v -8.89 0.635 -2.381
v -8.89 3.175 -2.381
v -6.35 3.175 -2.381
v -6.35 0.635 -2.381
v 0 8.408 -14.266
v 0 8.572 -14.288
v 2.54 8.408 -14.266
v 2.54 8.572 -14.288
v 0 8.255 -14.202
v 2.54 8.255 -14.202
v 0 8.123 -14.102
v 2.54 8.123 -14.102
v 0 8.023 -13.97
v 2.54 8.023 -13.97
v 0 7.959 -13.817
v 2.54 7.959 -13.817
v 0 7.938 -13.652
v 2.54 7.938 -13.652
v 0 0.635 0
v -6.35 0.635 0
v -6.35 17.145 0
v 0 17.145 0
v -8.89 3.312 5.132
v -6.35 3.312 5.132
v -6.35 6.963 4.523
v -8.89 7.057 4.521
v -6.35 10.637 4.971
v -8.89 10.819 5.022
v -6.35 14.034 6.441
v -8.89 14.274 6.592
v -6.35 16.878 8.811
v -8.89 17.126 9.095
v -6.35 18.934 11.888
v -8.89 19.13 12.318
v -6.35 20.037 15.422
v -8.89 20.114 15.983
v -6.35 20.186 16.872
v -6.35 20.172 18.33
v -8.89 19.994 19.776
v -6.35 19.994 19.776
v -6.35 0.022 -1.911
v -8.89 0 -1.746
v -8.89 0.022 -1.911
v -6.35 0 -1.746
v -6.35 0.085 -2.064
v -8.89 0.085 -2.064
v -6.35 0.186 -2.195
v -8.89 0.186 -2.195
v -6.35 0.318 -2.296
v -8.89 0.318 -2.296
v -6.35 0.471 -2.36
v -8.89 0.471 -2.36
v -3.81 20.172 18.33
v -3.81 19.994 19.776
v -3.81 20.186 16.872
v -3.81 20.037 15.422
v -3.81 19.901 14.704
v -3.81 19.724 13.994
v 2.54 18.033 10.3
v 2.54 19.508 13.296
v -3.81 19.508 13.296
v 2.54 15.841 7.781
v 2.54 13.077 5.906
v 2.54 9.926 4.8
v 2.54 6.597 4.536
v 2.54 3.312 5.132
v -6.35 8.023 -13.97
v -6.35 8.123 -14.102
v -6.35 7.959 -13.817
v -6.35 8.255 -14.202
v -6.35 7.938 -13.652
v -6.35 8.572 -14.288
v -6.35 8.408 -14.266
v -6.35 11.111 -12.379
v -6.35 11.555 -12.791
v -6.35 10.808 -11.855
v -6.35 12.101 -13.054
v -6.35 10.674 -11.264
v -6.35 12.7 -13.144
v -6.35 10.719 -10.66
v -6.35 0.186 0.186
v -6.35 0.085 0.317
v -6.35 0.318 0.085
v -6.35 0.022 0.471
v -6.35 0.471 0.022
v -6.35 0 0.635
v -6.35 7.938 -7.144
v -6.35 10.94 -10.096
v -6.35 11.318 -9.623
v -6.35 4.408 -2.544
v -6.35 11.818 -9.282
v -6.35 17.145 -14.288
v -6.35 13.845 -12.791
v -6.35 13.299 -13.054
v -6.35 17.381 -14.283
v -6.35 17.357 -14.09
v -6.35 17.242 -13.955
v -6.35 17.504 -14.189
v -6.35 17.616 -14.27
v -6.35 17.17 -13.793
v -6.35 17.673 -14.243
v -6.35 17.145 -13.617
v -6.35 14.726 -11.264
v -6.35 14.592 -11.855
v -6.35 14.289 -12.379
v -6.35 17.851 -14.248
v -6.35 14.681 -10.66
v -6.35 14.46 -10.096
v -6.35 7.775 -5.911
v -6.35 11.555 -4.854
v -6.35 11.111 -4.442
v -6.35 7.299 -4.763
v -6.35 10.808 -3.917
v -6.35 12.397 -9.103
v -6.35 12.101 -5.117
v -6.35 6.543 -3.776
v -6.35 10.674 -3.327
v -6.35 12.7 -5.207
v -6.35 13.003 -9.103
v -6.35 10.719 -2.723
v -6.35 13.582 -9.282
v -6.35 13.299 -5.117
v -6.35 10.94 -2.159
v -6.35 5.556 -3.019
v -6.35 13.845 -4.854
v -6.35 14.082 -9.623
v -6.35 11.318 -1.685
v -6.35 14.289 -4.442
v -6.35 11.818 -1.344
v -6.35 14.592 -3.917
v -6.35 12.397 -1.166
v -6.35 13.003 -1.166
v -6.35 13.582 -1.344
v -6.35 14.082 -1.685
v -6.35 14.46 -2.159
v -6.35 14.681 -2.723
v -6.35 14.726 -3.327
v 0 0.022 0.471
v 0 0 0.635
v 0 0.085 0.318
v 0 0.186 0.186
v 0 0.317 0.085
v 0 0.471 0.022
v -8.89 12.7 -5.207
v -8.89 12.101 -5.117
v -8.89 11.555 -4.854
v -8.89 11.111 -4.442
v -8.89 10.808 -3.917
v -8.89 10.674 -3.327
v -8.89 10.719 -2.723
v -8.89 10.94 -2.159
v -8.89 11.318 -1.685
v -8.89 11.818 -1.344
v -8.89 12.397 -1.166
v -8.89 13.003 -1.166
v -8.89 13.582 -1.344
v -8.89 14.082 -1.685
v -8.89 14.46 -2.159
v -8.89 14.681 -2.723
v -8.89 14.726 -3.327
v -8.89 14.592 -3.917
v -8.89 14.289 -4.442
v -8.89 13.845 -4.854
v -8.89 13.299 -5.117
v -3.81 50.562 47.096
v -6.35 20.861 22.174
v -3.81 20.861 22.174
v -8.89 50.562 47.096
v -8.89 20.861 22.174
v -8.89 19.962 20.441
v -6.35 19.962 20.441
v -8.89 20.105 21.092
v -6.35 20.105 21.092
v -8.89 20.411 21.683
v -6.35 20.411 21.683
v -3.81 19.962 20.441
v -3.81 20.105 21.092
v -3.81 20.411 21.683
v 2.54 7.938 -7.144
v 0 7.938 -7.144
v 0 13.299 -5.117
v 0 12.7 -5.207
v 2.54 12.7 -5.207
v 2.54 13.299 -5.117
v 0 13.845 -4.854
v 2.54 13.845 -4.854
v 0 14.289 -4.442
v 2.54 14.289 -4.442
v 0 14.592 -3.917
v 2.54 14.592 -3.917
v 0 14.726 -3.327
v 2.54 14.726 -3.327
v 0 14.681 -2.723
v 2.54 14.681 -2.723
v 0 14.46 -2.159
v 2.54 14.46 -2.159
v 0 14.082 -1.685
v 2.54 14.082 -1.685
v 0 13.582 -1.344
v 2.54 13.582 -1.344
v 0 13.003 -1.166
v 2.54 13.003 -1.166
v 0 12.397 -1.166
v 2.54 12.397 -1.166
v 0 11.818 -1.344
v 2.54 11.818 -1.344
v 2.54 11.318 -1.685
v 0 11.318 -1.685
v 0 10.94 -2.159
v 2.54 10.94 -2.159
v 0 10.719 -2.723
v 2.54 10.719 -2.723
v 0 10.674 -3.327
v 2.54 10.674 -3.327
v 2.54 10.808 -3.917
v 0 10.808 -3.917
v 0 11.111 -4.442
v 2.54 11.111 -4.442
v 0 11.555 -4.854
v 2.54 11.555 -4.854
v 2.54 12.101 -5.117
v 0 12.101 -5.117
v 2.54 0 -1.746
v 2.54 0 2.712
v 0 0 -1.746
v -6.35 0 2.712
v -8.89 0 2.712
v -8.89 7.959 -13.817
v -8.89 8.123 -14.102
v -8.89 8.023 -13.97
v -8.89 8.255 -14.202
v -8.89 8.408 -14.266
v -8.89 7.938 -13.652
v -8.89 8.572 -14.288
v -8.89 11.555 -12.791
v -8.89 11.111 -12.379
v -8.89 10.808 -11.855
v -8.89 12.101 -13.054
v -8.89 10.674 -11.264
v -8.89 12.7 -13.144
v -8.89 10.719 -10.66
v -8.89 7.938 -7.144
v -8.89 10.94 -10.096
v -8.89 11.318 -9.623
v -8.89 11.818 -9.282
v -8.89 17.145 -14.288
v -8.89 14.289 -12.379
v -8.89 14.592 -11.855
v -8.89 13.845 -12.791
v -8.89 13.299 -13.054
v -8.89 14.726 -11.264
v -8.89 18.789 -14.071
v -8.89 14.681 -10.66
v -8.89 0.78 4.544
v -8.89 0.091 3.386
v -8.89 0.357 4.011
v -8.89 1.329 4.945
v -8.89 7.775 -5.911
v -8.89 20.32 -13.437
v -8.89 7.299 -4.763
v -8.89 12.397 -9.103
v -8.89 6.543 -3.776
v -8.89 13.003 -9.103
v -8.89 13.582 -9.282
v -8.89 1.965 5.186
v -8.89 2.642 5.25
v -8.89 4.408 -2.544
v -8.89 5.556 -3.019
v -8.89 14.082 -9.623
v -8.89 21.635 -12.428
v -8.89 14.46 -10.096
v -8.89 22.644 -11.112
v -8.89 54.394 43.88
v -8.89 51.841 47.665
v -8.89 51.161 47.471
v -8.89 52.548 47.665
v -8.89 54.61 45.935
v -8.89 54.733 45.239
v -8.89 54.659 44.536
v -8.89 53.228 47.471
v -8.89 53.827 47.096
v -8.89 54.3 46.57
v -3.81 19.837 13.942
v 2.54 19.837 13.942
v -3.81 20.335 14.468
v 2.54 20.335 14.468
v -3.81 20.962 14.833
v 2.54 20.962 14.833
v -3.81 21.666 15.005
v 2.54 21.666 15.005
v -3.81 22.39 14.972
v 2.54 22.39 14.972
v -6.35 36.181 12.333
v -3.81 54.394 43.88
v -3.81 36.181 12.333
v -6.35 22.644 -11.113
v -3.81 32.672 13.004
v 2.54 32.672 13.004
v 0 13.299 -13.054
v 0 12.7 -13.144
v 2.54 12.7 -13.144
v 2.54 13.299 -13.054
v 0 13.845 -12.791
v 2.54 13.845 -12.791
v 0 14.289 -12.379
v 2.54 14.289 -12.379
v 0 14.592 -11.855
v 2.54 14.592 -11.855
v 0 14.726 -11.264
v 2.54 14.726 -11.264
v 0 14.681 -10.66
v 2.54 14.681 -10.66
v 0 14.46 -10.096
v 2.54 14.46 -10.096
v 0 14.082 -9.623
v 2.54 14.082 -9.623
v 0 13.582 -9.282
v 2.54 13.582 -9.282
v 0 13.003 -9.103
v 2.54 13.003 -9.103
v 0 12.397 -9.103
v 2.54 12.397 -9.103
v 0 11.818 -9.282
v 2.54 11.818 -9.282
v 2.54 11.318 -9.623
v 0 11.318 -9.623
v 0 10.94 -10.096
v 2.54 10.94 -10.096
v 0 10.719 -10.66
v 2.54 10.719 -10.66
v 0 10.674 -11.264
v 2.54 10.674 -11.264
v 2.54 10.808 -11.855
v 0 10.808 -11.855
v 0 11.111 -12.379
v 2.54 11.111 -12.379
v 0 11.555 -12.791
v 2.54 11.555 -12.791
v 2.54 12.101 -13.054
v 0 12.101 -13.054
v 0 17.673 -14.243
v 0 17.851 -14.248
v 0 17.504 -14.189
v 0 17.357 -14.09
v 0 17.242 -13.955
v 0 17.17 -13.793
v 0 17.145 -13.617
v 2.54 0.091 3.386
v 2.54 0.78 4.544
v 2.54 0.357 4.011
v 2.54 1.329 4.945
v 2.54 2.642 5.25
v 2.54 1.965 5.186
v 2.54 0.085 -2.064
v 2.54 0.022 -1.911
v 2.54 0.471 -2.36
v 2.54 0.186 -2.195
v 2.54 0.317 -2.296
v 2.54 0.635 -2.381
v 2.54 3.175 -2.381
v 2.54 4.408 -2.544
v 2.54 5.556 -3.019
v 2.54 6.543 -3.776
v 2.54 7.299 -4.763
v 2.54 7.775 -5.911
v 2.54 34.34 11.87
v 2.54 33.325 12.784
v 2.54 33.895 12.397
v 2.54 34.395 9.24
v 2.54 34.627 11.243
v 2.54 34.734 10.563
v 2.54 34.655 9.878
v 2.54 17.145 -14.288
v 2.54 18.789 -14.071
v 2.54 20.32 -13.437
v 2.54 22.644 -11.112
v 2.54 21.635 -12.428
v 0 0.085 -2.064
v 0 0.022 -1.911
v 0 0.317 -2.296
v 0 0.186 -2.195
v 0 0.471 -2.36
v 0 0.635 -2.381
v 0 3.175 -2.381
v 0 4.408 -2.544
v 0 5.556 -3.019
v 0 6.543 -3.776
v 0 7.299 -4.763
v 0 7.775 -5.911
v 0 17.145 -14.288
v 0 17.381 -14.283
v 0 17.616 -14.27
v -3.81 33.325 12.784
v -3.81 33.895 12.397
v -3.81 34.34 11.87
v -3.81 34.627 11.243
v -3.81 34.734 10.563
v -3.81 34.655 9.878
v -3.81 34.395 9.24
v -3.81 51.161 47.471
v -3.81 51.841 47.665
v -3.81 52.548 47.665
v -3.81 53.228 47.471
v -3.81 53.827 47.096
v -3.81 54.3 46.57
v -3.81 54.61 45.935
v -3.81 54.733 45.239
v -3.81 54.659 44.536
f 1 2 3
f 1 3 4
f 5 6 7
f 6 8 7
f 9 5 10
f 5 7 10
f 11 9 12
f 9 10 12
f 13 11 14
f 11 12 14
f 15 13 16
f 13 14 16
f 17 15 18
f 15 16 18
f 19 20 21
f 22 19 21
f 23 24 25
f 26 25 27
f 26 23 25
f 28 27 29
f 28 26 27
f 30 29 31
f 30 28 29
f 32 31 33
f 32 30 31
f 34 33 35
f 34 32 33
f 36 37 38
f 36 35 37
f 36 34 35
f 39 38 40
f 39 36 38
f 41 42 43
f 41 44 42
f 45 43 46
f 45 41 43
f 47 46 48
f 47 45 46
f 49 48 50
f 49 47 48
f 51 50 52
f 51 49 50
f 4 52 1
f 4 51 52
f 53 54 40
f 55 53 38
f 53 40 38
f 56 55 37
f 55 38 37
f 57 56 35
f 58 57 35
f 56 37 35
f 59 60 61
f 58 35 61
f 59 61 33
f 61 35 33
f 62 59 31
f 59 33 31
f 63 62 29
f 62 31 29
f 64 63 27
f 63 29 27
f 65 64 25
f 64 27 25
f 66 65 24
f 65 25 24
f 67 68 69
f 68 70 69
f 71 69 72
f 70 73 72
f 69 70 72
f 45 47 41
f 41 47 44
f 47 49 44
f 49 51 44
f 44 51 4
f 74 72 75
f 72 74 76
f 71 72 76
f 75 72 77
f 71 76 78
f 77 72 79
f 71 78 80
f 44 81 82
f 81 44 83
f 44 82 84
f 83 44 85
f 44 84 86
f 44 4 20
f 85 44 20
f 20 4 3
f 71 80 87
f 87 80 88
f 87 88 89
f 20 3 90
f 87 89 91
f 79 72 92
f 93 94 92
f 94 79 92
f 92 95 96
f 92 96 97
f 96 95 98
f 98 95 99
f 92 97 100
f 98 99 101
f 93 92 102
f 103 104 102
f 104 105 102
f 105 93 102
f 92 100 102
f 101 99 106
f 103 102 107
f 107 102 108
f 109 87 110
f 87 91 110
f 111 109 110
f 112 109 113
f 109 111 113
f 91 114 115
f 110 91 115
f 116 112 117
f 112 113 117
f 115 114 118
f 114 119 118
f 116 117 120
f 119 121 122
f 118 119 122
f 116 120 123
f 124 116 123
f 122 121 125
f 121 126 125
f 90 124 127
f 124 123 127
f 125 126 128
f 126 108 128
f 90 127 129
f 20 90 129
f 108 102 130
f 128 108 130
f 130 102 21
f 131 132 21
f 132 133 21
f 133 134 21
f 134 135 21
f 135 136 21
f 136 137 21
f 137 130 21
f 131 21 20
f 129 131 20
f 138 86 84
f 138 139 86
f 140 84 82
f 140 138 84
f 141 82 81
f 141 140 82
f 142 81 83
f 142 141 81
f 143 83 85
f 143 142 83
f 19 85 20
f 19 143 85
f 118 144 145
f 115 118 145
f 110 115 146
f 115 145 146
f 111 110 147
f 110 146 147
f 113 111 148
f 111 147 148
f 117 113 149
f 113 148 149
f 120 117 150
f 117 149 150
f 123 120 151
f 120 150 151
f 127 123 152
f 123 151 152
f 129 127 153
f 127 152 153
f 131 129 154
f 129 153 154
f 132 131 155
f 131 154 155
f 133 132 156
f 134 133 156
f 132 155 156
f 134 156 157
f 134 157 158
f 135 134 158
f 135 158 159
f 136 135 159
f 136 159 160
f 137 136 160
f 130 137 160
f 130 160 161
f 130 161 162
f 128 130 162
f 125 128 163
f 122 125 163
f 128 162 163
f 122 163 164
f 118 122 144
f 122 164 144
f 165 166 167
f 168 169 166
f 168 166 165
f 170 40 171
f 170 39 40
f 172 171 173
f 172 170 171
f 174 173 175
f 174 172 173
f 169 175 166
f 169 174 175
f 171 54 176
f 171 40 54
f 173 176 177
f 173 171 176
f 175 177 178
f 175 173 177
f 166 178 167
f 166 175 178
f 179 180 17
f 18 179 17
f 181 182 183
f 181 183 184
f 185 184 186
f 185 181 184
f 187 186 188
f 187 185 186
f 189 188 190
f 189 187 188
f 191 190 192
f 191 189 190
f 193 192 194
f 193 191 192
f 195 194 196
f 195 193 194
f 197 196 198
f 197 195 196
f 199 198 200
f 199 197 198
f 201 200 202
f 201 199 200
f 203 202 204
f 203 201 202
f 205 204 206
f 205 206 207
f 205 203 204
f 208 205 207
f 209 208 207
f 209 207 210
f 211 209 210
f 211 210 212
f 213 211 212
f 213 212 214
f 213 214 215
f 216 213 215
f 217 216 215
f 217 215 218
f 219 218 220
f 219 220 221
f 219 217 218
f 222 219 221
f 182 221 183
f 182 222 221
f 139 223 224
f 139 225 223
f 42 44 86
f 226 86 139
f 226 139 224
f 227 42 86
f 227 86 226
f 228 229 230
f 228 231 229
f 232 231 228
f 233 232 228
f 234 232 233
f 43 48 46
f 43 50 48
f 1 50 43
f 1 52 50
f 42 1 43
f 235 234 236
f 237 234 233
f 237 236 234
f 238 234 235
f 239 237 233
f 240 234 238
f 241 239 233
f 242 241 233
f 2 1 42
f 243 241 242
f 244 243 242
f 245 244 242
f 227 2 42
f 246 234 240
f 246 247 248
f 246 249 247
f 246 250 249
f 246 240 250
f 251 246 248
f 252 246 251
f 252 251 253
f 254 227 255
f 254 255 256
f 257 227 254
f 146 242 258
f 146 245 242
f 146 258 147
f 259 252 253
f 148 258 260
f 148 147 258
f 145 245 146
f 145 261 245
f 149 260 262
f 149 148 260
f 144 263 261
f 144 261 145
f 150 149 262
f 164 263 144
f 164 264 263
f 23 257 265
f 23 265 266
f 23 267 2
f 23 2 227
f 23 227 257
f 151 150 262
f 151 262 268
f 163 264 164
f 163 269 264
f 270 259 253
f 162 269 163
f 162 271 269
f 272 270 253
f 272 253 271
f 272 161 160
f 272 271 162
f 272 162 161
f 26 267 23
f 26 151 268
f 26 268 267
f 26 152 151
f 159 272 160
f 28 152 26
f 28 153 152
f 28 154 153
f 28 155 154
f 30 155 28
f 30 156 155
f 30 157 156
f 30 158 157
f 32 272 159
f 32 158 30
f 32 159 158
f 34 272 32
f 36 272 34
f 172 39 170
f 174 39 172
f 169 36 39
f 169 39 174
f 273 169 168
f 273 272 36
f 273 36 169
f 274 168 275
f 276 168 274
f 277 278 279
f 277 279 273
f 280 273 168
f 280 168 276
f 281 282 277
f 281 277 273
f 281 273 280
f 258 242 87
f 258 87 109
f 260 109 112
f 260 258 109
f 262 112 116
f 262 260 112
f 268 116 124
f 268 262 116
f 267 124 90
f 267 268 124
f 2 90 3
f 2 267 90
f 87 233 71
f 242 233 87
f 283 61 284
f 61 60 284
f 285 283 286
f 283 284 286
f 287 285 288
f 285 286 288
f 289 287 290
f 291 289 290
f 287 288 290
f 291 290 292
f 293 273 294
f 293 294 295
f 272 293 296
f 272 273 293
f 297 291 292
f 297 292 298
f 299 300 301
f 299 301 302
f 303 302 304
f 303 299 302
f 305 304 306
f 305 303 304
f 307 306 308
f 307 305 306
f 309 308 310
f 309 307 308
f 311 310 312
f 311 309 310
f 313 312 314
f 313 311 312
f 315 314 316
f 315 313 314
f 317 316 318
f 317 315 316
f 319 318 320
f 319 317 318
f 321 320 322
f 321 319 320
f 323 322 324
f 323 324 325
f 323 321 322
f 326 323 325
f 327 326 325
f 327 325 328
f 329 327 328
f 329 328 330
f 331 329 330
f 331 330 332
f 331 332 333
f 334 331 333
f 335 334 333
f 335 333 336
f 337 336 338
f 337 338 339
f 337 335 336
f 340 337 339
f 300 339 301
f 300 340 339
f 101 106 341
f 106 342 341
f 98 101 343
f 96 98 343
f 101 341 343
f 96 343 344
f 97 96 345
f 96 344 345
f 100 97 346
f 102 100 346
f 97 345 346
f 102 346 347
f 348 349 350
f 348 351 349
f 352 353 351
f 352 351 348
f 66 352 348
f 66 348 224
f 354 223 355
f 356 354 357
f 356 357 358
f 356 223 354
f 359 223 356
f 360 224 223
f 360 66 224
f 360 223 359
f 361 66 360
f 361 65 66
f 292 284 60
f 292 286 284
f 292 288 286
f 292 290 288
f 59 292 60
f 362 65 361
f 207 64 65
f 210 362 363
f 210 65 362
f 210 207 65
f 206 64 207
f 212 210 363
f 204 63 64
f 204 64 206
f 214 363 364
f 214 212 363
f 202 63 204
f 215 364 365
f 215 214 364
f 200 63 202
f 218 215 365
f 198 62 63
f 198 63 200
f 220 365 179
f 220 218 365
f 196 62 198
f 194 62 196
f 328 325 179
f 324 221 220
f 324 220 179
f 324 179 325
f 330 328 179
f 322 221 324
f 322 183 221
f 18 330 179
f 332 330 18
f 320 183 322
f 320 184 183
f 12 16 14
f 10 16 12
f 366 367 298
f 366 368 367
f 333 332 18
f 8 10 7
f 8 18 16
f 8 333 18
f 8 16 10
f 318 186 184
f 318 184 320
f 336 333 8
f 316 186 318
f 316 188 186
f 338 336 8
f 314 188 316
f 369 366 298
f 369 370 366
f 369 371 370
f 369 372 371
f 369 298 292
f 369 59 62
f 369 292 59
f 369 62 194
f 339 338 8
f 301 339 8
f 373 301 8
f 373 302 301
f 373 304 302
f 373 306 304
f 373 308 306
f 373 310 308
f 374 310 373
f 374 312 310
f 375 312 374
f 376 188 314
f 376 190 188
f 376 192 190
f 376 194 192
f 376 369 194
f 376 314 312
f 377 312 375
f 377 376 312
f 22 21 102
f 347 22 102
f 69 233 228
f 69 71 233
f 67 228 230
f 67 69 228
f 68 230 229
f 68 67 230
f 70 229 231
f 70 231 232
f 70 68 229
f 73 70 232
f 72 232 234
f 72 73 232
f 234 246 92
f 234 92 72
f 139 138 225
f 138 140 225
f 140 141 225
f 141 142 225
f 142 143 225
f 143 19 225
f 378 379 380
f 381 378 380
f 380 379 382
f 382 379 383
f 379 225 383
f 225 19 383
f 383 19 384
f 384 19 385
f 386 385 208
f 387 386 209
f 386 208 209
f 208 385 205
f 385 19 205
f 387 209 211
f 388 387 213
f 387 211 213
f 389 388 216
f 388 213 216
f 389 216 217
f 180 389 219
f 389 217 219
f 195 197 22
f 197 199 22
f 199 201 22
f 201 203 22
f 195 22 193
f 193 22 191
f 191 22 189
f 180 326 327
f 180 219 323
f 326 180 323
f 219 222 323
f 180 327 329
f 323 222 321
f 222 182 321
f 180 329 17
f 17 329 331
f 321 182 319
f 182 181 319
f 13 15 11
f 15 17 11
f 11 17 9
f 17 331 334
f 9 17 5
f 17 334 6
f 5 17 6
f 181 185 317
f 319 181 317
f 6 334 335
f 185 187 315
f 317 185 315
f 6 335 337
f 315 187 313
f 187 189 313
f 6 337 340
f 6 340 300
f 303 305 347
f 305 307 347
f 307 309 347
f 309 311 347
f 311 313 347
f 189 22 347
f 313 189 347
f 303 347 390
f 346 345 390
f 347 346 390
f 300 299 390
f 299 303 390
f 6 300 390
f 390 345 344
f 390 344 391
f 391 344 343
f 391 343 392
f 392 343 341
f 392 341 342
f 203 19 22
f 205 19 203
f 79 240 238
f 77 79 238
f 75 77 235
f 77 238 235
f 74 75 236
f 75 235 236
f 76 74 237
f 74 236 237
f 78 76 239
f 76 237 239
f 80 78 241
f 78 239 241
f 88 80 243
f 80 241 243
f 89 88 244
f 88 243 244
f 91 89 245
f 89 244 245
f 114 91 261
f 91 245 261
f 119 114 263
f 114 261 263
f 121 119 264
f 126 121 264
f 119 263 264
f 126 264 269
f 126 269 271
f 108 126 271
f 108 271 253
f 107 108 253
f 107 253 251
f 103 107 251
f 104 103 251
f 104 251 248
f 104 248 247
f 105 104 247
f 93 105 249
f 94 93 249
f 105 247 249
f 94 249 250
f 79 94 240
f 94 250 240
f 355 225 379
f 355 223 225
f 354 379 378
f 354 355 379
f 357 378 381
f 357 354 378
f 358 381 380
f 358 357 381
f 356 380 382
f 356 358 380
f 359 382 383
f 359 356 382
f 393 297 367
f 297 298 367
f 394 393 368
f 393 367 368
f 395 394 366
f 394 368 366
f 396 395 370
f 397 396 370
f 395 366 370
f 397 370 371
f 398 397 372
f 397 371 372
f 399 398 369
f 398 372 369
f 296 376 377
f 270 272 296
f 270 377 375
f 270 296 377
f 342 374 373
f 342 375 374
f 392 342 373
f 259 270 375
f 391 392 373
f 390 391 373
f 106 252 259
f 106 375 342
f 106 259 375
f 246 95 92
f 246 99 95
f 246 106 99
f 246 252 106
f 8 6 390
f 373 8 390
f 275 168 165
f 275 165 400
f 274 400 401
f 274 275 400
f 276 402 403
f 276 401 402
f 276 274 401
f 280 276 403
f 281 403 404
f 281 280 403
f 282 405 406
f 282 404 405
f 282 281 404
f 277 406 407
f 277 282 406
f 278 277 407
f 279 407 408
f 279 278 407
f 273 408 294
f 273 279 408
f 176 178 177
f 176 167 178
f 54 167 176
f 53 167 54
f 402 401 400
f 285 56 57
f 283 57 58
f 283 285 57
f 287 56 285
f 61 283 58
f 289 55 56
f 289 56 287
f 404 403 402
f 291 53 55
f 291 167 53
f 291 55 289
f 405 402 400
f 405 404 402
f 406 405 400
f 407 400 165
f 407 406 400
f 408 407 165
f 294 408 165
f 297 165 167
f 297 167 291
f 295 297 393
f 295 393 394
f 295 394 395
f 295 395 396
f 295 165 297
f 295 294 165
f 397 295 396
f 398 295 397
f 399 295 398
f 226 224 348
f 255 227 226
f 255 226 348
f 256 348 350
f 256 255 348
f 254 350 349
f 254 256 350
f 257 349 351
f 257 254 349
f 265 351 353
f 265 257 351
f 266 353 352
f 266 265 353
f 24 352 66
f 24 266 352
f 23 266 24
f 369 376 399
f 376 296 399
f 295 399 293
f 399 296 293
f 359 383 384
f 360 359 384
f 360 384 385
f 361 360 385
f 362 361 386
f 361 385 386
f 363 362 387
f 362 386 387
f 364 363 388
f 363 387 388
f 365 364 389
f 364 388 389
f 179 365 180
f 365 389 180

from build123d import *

# Parameters (mm, degrees)
SKETCH1_R           = 2.032
BOSS_EXTRUDE1_DEPTH = 2.54
BOSS_EXTRUDE2_START = -6.35
BOSS_EXTRUDE2_DEPTH = 6.35
BOSS_EXTRUDE3_START = 2.54
SKETCH4_R           = 2.032
BOSS_EXTRUDE3_DEPTH = 2.54
CUT_EXTRUDE2_START  = -6.35
CUT_EXTRUDE2_DEPTH  = 6.35
FILLET1_R           = 2.54
FILLET2_R           = 0.635


with BuildPart() as part:
    # Sketch1 → Boss-Extrude1 (new body)
    # profile 1 of 3: a face of its own
    with BuildSketch(Plane(origin=(0, 0, 0), x_dir=(0, 0, -1), z_dir=(1, 0, 0))):
        with BuildLine():
            Line((-6.736031019, 0), (0, 0))
            Line((0, 0), (0, 17.145))
            Line((0, 17.145), (14.2875, 17.145))
            ThreePointArc((14.2875, 17.145), (13.436761314, 20.32), (11.1125, 22.644261314))
            Line((11.1125, 22.644261314), (-12.333226749, 36.180657964))
            Line((-12.333226749, 36.180657964), (-15.422016596, 20.036703186))
            ThreePointArc((-15.422016596, 20.036703186), (-5.588466213, 12.398528792), (-6.736031019, 0))
        make_face()
    # profile 2 of 3: a face of its own
    with BuildSketch(Plane(origin=(0, 0, 0), x_dir=(0, 0, -1), z_dir=(1, 0, 0))):
        with BuildLine():
            Line((0, 0), (2.38125, 0))
            Line((2.38125, 0), (2.38125, 3.175))
            ThreePointArc((2.38125, 3.175), (3.776153955, 6.542596045), (7.14375, 7.9375))
            Line((7.14375, 7.9375), (14.2875, 7.9375))
            Line((14.2875, 7.9375), (14.2875, 17.145))
            Line((14.2875, 17.145), (0, 17.145))
            Line((0, 17.145), (0, 0))
        make_face()
        with Locations((3.175, 12.7)):
            Circle(SKETCH1_R, mode=Mode.SUBTRACT)
        with Locations((11.1125, 12.7)):
            Circle(SKETCH1_R, mode=Mode.SUBTRACT)
    # profile 3 of 3: a face of its own
    with BuildSketch(Plane(origin=(0, 0, 0), x_dir=(0, 0, -1), z_dir=(1, 0, 0))):
        with BuildLine():
            ThreePointArc((-21.168019902, 19.662272494), (-18.316086524, 20.172801019), (-15.422016596, 20.036703186))
            Line((-15.422016596, 20.036703186), (-12.333226749, 36.180657964))
            Line((-12.333226749, 36.180657964), (-43.88011314, 54.394261314))
            ThreePointArc((-43.88011314, 54.394261314), (-47.095866026, 53.827237317), (-47.095866026, 50.56187626))
            Line((-47.095866026, 50.56187626), (-21.168019902, 19.662272494))
        make_face()
    extrude(amount=BOSS_EXTRUDE1_DEPTH)

    # Sketch1<4> → Boss-Extrude2 (add)
    with BuildSketch(Plane(origin=(0, 0, 0), x_dir=(0, 0, -1), z_dir=(1, 0, 0)).offset(BOSS_EXTRUDE2_START)):
        with BuildLine():
            Line((-6.736031019, 0), (0, 0))
            Line((0, 0), (0, 17.145))
            Line((0, 17.145), (14.2875, 17.145))
            ThreePointArc((14.2875, 17.145), (13.436761314, 20.32), (11.1125, 22.644261314))
            Line((11.1125, 22.644261314), (-12.333226749, 36.180657964))
            Line((-12.333226749, 36.180657964), (-15.422016596, 20.036703186))
            ThreePointArc((-15.422016596, 20.036703186), (-5.588466213, 12.398528792), (-6.736031019, 0))
        make_face()
        with BuildLine():
            ThreePointArc((-21.168019902, 19.662272494), (-18.316086524, 20.172801019), (-15.422016596, 20.036703186))
            Line((-15.422016596, 20.036703186), (-12.333226749, 36.180657964))
            Line((-12.333226749, 36.180657964), (-43.88011314, 54.394261314))
            ThreePointArc((-43.88011314, 54.394261314), (-47.095866026, 53.827237317), (-47.095866026, 50.56187626))
            Line((-47.095866026, 50.56187626), (-21.168019902, 19.662272494))
        make_face()
    extrude(amount=BOSS_EXTRUDE2_DEPTH)

    # Sketch4 → Boss-Extrude3 (add)
    with BuildSketch(Plane.ZY.offset(6.35).offset(BOSS_EXTRUDE3_START)):
        with BuildLine():
            Line((-2.38125, 0), (6.736031019, 0))
            ThreePointArc((6.736031019, 0), (7.030863273, 14.911227359), (21.168019902, 19.662272494))
            Line((21.168019902, 19.662272494), (47.095866026, 50.56187626))
            ThreePointArc((47.095866026, 50.56187626), (47.095866026, 53.827237317), (43.88011314, 54.394261314))
            Line((43.88011314, 54.394261314), (-11.1125, 22.644261314))
            ThreePointArc((-11.1125, 22.644261314), (-13.436761314, 20.32), (-14.2875, 17.145))
            Line((-14.2875, 17.145), (-14.2875, 7.9375))
            Line((-14.2875, 7.9375), (-7.14375, 7.9375))
            ThreePointArc((-7.14375, 7.9375), (-3.776153955, 6.542596045), (-2.38125, 3.175))
            Line((-2.38125, 3.175), (-2.38125, 0))
        make_face()
        with Locations(Location((-3.175, 12.7, 0), (0, 0, 180))):
            Circle(SKETCH4_R, mode=Mode.SUBTRACT)
        with Locations(Location((-11.1125, 12.7, 0), (0, 0, 180))):
            Circle(SKETCH4_R, mode=Mode.SUBTRACT)
    extrude(amount=-BOSS_EXTRUDE3_DEPTH)

    # Sketch5 → Cut-Extrude2 (cut)
    with BuildSketch(Plane(origin=(2.54, 0, 0), x_dir=(0, 0, -1), z_dir=(1, 0, 0)).offset(CUT_EXTRUDE2_START)):
        with BuildLine():
            Line((-15.422016596, 20.036703186), (-12.333226749, 36.180657964))
            Line((-12.333226749, 36.180657964), (-43.88011314, 54.394261314))
            ThreePointArc((-43.88011314, 54.394261314), (-47.095866026, 53.827237317), (-47.095866026, 50.56187626))
            Line((-47.095866026, 50.56187626), (-21.168019902, 19.662272494))
            ThreePointArc((-21.168019902, 19.662272494), (-18.316086524, 20.172801019), (-15.422016596, 20.036703186))
        make_face()
    extrude(amount=CUT_EXTRUDE2_DEPTH, mode=Mode.SUBTRACT)

    # Fillet1
    fillet1_edges = [part.edges().sort_by_distance(p)[0] for p in [
        (-3.175, 0, 6.736031019),
        (-6.35, 19.662272494, 21.168019902),
        (-0.635, 36.180657964, 12.333226749),
        (-0.635, 20.036703186, 15.422016596),
    ]]
    fillet(fillet1_edges, radius=FILLET1_R)

    # Fillet2
    fillet2_edges = [part.edges().sort_by_distance(p)[0] for p in [
        (1.27, 7.9375, -14.2875),
        (1.27, 0, -2.38125),
        (-3.175, 17.145, -14.2875),
        (-3.175, 0, 0),
        (-7.62, 7.9375, -14.2875),
        (-7.62, 0, -2.38125),
    ]]
    fillet(fillet2_edges, radius=FILLET2_R)


solid = part.part
